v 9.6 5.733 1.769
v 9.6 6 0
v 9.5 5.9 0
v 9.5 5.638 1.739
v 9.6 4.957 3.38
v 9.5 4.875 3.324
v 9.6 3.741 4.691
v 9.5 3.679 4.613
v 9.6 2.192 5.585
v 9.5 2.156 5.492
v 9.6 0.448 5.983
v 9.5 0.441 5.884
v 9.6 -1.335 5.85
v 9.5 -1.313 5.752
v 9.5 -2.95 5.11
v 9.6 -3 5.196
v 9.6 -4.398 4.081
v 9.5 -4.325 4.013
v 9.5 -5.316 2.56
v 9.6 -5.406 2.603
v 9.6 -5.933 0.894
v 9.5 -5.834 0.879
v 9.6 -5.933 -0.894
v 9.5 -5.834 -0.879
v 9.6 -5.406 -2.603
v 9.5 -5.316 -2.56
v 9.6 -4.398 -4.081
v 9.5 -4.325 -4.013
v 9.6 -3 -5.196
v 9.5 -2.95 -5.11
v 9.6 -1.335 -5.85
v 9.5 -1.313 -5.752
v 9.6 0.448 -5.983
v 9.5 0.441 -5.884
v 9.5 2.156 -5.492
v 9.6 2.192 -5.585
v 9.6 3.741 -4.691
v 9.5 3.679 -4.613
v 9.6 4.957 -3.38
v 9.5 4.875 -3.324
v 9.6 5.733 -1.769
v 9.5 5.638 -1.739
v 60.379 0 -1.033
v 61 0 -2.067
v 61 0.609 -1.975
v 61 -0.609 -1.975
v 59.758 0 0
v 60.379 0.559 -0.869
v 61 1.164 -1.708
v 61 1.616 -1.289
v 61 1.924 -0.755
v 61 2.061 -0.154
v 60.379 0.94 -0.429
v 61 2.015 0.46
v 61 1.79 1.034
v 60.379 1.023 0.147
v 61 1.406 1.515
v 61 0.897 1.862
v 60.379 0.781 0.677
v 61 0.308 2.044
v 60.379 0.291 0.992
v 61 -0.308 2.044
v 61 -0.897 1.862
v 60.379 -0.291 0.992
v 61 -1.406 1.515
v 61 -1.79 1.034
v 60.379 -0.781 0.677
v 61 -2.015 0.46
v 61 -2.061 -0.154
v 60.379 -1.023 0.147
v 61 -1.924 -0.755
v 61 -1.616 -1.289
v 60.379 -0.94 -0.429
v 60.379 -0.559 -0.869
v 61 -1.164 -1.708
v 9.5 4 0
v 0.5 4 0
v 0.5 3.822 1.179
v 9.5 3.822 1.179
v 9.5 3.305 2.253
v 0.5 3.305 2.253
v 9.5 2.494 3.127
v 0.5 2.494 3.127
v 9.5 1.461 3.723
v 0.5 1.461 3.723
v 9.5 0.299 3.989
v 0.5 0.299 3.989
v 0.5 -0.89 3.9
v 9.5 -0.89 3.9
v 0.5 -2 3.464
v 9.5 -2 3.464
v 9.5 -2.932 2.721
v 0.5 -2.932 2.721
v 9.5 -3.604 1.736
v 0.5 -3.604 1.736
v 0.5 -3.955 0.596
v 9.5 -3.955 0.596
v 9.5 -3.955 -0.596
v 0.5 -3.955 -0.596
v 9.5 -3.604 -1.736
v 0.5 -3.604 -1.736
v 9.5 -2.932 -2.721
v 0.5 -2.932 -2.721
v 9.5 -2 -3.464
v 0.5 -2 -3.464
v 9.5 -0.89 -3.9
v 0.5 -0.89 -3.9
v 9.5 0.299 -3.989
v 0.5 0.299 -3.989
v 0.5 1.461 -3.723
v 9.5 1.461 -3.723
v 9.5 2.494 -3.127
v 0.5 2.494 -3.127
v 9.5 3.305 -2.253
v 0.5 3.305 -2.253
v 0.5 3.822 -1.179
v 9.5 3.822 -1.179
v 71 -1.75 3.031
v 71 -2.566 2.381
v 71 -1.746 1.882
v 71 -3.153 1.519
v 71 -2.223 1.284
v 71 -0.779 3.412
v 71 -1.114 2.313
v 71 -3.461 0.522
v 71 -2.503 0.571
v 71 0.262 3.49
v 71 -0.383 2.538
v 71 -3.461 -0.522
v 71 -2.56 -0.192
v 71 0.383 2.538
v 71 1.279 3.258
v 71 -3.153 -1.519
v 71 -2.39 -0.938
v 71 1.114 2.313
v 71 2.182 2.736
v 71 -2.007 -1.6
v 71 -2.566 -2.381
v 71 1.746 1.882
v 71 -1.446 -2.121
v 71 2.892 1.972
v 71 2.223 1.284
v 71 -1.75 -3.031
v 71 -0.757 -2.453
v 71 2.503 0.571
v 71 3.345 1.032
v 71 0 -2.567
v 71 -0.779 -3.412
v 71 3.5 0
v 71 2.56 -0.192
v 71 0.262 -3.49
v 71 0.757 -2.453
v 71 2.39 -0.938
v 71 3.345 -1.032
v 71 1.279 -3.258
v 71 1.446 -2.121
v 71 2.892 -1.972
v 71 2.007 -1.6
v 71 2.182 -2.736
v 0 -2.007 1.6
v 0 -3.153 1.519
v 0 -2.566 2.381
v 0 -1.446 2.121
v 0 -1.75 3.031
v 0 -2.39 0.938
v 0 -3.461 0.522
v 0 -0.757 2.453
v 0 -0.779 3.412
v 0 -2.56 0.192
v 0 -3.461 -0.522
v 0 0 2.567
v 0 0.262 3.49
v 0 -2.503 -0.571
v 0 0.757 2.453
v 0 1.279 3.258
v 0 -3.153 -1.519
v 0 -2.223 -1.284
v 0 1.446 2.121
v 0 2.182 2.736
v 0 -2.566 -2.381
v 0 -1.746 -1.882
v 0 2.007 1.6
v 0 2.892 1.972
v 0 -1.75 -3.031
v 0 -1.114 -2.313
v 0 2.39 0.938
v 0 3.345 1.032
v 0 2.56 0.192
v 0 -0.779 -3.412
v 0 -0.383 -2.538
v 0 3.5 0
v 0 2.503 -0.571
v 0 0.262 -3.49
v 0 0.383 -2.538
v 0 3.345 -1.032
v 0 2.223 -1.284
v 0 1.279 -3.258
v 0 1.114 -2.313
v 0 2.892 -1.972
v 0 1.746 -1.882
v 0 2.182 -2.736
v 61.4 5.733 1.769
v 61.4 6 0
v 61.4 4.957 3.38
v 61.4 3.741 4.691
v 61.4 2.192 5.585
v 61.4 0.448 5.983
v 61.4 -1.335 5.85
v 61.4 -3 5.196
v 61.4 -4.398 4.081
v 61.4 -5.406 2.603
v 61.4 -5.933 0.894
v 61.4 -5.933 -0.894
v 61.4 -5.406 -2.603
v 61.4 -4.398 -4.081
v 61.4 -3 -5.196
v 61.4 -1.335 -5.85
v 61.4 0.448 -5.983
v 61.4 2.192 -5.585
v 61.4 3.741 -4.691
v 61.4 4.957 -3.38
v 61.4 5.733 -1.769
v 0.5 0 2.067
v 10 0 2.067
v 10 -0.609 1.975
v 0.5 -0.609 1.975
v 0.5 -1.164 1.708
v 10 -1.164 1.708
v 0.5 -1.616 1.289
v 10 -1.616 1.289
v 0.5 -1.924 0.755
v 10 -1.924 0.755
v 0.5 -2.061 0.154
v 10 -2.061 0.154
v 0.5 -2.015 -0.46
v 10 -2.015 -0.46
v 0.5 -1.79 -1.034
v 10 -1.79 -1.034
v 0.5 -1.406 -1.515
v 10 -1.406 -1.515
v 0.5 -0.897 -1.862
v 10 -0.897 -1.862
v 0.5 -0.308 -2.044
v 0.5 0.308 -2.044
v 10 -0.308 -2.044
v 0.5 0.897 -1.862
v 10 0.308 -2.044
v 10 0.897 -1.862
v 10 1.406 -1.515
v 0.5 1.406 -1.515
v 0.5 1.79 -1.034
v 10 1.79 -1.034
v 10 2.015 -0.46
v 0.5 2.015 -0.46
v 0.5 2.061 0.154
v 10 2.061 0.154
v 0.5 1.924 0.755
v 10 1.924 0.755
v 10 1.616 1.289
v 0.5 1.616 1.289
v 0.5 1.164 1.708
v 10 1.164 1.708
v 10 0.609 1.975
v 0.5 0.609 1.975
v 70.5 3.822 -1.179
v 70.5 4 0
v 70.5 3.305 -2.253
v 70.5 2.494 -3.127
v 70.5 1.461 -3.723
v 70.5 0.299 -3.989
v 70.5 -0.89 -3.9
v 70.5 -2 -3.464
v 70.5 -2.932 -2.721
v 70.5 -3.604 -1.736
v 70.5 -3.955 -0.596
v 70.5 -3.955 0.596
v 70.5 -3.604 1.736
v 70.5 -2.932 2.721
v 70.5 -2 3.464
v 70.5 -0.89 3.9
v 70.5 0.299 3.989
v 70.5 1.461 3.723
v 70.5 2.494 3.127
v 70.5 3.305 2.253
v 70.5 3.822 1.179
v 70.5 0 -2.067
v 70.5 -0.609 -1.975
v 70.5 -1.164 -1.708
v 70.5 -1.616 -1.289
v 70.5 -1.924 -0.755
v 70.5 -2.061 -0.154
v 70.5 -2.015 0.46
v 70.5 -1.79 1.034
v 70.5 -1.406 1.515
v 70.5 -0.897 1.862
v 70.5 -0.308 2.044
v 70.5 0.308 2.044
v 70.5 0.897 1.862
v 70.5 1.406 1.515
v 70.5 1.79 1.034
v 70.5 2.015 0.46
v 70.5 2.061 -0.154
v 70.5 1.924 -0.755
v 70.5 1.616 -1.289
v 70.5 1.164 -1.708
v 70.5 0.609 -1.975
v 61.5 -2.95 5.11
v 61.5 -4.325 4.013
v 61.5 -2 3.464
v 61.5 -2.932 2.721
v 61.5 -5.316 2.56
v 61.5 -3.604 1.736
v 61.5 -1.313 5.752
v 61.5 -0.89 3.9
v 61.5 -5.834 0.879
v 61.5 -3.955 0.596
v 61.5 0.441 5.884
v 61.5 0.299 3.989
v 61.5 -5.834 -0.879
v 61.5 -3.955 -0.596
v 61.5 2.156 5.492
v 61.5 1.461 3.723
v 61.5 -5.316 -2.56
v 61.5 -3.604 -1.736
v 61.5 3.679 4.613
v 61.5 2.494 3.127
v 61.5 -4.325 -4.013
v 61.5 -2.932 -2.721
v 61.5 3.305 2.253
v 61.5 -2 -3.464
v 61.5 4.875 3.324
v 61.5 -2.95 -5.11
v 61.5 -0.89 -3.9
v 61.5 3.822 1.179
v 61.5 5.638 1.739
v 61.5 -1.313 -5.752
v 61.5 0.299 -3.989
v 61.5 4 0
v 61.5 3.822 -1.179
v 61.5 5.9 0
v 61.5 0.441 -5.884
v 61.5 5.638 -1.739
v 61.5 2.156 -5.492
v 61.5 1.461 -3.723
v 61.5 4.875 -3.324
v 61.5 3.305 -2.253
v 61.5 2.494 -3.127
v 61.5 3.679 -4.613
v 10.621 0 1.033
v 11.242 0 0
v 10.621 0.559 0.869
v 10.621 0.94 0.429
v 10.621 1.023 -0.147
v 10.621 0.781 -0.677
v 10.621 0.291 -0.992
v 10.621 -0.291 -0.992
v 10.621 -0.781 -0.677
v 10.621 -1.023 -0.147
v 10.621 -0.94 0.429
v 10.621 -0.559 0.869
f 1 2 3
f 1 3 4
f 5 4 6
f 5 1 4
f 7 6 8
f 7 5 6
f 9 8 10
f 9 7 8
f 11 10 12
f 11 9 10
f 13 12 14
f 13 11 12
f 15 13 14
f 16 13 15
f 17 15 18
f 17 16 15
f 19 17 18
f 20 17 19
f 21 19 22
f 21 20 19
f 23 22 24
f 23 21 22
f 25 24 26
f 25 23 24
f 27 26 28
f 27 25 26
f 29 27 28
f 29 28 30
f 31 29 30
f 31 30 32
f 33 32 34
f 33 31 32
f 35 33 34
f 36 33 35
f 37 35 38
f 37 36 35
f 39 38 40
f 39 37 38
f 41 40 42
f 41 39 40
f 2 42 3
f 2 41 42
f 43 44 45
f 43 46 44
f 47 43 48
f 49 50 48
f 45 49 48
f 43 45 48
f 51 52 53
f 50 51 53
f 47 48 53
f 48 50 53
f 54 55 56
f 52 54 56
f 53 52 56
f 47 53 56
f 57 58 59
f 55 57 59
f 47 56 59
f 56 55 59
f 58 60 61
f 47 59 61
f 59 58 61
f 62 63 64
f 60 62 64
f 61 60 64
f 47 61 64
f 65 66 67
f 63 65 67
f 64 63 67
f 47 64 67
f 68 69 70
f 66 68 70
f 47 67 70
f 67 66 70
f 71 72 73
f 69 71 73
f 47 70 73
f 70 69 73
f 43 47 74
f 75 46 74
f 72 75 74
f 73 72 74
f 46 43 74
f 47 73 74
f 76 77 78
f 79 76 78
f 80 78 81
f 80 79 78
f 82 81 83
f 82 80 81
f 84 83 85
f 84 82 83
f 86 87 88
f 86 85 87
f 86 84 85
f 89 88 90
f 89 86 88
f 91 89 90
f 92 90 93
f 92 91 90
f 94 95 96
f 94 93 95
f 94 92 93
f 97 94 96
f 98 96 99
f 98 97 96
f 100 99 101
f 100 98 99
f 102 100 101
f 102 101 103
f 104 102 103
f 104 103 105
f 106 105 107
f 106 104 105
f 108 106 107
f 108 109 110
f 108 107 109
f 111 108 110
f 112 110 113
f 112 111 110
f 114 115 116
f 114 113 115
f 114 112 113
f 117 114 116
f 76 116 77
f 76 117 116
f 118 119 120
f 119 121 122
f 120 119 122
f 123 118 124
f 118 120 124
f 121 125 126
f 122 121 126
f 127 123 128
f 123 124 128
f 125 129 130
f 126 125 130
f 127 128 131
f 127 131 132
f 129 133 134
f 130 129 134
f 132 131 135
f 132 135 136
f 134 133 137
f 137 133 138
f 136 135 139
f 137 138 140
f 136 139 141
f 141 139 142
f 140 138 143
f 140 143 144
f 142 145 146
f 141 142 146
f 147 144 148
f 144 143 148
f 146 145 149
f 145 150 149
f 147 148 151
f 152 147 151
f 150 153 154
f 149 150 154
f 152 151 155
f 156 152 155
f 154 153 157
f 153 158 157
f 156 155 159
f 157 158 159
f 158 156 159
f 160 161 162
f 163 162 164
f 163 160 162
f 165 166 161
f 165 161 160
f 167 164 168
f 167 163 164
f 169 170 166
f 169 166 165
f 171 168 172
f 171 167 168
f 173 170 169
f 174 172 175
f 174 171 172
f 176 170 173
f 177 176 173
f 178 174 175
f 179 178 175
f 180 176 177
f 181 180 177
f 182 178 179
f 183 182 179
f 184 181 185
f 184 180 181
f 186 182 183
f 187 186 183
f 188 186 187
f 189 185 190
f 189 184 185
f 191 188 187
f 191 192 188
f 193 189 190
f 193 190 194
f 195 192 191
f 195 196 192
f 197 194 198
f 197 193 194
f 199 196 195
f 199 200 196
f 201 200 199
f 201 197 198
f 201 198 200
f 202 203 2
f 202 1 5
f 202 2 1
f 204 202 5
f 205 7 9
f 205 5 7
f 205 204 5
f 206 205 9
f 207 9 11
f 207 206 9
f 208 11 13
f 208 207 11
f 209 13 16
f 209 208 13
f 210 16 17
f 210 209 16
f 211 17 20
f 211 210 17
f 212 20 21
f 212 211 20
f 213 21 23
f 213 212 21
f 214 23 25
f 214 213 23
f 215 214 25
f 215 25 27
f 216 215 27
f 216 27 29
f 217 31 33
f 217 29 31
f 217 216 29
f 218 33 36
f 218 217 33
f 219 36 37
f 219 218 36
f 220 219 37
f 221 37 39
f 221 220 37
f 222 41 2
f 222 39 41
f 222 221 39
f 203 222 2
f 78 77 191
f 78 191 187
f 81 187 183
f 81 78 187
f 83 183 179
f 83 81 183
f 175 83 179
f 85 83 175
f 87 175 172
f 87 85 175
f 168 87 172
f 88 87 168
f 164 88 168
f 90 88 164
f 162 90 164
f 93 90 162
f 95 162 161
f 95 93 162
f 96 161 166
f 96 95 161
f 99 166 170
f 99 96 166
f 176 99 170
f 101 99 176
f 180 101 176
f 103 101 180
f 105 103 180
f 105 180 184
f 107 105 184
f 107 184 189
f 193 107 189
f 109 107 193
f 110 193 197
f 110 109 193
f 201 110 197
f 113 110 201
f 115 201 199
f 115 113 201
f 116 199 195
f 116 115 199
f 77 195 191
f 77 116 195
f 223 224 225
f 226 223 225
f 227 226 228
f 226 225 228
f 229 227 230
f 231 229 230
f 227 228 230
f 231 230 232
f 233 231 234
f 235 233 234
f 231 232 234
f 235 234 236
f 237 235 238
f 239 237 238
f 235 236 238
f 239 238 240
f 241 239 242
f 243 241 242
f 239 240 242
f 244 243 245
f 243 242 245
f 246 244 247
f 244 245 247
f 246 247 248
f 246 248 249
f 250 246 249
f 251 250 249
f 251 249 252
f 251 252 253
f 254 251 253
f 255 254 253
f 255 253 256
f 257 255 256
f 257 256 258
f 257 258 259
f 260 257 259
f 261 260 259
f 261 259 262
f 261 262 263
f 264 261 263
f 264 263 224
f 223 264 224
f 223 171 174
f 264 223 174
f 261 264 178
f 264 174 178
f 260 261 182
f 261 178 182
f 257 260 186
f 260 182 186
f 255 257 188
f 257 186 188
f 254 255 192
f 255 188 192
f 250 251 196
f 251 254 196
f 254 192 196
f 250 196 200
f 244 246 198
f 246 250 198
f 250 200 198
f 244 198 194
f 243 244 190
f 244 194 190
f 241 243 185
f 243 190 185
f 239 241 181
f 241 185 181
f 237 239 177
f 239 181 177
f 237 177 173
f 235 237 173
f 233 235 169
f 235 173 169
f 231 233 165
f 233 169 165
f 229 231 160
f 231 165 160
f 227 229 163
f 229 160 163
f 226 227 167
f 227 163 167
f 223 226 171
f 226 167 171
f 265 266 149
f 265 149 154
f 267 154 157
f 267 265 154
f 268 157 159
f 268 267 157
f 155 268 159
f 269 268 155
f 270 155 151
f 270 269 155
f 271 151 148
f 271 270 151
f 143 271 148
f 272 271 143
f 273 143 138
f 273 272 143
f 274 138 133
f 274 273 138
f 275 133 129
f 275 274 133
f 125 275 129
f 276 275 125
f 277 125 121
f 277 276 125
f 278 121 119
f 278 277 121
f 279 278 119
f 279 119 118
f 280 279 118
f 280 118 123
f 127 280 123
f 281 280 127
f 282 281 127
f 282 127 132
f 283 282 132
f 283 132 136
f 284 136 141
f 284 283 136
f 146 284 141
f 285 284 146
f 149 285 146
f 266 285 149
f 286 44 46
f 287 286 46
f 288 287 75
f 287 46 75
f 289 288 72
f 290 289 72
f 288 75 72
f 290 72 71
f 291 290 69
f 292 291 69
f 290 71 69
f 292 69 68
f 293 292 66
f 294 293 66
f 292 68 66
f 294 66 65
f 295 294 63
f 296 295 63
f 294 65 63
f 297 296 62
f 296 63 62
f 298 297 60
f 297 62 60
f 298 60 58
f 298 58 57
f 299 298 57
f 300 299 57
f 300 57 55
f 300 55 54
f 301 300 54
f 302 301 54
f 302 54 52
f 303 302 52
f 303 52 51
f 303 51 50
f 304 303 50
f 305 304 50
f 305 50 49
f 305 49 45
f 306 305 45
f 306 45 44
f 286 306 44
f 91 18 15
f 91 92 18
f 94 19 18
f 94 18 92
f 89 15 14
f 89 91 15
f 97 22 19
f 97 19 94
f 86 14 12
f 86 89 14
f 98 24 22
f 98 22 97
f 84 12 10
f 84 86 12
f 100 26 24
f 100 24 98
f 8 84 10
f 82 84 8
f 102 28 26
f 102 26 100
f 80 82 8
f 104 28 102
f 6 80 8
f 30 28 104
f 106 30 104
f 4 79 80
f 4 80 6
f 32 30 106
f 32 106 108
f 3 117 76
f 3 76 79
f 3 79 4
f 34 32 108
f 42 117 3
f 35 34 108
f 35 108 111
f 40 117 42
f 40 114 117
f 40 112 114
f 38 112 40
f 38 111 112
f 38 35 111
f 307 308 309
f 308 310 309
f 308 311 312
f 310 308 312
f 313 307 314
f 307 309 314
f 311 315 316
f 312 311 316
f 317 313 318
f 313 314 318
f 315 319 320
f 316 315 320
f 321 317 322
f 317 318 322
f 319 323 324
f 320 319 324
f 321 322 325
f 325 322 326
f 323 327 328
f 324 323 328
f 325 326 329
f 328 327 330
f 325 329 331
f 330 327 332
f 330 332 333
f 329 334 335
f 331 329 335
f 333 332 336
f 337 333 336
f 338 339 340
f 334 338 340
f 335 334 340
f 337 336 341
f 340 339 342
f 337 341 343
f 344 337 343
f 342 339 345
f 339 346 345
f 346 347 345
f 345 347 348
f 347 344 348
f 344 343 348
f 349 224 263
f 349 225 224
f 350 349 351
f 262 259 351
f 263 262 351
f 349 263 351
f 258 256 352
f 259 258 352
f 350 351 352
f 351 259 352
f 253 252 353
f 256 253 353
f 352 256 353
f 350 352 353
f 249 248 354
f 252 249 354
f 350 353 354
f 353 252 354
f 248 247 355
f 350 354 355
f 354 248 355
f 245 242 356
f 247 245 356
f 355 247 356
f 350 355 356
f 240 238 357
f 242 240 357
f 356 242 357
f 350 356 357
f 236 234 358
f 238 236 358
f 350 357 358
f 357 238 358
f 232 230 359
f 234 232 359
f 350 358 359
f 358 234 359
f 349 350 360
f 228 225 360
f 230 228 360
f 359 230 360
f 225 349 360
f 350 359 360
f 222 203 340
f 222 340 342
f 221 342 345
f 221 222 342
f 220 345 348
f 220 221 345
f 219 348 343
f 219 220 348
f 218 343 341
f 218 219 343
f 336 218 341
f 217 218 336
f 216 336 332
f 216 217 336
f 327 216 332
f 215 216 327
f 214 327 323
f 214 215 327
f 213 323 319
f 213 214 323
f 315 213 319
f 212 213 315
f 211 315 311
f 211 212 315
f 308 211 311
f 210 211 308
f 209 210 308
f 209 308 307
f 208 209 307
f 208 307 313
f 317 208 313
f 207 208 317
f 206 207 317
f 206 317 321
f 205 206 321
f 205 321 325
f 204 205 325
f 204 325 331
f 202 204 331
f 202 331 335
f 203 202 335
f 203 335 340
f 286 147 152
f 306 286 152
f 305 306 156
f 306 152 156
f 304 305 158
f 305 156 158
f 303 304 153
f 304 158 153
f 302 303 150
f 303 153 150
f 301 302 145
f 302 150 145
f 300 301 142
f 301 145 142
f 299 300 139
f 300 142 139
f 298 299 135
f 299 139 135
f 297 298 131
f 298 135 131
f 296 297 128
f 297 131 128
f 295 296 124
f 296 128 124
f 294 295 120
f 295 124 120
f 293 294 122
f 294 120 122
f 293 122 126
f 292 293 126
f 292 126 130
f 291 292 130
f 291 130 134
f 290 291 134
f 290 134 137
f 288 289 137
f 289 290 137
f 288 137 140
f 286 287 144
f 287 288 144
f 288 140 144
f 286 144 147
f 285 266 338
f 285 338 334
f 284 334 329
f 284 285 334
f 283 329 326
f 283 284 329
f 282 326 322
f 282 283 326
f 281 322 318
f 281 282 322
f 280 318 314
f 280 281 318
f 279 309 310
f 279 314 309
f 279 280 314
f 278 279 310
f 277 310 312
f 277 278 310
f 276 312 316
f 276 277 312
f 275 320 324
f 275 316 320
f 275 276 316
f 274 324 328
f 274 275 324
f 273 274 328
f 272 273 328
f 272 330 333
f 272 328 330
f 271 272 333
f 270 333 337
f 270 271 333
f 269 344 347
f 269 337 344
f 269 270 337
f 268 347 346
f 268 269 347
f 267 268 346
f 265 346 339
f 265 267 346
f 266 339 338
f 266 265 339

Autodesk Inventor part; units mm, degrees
ref_plane "YZ Plane" through (0, 0, 0) normal (1, 0, 0) x (0, 1, 0)
ref_plane "XZ Plane" through (0, 0, 0) normal (0, 1, 0) x (-1, 0, 0)
ref_plane "XY Plane" through (0, 0, 0) normal (0, 0, 1) x (1, 0, 0)
sketch "Skizze1" plane through (0, 0, 0) normal (0, 0, 1) x (1, 0, 0)
  line L0 (0, 0) -> (0, 4)
  line L1 (0, 4) -> (9.5, 4)
  line L2 (9.5, 4) -> (9.5, 6)
  line L3 (9.5, 6) -> (61.5, 6)
  line L4 (61.5, 6) -> (61.5, 4)
  line L5 (61.5, 4) -> (71, 4)
  line L6 (71, 4) -> (71, 0)
  line L7 (71, 0) -> (0, 0)
  dimension "d1" = 9.5
  dimension "d2" = 9.5
  dimension "d3" = 8
  dimension "d4" = 12
  dimension "d29" = 52
revolve "Umdrehung1" add sketch "Skizze1" angle 360 about axis through (71, 0, 0) along (-1, 0, 0)
sketch "Skizze2" plane through (0, 0, 0) normal (-1, 0, 0) x (0, 0, 1)
  point P0 (0, 0)
  point P1 (0, 0)
sketch "Skizze3" plane through (71, 0, 0) normal (1, 0, 0) x (0, 0, -1)
  point P0 (0, 0)
  point P1 (0, 0)
hole "Bohrung1" at (71, 0, 0) direction (-1, 0, 0) diameter 4.134 depth 10 tip angle 118 thread size "M5x0.8" class "6H" standard "ISO Metric profile"
hole "Bohrung2" at (0, 0, 0) direction (1, 0, 0) diameter 4.134 depth 10 tip angle 118 thread size "M5x0.8" class "6H" standard "ISO Metric profile"
chamfer "Fase1" distance 0.5 angle 45 4 edges at (0, -4, 0) (71, -4, 0) (71, 0, 2.067) (0, 0, -2.067)
chamfer "Fase2" distance 0.1 angle 45 2 edges at (61.5, -6, 0) (9.5, -6, 0)
equation "\"d1\" = d2"
equation "\"d29\" = MainAxis_Schluesselweite + 2 * ParallelMech_Distance_Step2Flat"
equation "\"Flansch_ParralelMech_FlatPart_Width\" = 115"
equation "\"MainAxis_Schluesselweite\" = 24"
equation "\"ParallelMech_Distance_Step2Flat\" = 14"
properties part number "ParallelSystem_ProximalPart_Querstreben_v2" material "Edelstahl"
